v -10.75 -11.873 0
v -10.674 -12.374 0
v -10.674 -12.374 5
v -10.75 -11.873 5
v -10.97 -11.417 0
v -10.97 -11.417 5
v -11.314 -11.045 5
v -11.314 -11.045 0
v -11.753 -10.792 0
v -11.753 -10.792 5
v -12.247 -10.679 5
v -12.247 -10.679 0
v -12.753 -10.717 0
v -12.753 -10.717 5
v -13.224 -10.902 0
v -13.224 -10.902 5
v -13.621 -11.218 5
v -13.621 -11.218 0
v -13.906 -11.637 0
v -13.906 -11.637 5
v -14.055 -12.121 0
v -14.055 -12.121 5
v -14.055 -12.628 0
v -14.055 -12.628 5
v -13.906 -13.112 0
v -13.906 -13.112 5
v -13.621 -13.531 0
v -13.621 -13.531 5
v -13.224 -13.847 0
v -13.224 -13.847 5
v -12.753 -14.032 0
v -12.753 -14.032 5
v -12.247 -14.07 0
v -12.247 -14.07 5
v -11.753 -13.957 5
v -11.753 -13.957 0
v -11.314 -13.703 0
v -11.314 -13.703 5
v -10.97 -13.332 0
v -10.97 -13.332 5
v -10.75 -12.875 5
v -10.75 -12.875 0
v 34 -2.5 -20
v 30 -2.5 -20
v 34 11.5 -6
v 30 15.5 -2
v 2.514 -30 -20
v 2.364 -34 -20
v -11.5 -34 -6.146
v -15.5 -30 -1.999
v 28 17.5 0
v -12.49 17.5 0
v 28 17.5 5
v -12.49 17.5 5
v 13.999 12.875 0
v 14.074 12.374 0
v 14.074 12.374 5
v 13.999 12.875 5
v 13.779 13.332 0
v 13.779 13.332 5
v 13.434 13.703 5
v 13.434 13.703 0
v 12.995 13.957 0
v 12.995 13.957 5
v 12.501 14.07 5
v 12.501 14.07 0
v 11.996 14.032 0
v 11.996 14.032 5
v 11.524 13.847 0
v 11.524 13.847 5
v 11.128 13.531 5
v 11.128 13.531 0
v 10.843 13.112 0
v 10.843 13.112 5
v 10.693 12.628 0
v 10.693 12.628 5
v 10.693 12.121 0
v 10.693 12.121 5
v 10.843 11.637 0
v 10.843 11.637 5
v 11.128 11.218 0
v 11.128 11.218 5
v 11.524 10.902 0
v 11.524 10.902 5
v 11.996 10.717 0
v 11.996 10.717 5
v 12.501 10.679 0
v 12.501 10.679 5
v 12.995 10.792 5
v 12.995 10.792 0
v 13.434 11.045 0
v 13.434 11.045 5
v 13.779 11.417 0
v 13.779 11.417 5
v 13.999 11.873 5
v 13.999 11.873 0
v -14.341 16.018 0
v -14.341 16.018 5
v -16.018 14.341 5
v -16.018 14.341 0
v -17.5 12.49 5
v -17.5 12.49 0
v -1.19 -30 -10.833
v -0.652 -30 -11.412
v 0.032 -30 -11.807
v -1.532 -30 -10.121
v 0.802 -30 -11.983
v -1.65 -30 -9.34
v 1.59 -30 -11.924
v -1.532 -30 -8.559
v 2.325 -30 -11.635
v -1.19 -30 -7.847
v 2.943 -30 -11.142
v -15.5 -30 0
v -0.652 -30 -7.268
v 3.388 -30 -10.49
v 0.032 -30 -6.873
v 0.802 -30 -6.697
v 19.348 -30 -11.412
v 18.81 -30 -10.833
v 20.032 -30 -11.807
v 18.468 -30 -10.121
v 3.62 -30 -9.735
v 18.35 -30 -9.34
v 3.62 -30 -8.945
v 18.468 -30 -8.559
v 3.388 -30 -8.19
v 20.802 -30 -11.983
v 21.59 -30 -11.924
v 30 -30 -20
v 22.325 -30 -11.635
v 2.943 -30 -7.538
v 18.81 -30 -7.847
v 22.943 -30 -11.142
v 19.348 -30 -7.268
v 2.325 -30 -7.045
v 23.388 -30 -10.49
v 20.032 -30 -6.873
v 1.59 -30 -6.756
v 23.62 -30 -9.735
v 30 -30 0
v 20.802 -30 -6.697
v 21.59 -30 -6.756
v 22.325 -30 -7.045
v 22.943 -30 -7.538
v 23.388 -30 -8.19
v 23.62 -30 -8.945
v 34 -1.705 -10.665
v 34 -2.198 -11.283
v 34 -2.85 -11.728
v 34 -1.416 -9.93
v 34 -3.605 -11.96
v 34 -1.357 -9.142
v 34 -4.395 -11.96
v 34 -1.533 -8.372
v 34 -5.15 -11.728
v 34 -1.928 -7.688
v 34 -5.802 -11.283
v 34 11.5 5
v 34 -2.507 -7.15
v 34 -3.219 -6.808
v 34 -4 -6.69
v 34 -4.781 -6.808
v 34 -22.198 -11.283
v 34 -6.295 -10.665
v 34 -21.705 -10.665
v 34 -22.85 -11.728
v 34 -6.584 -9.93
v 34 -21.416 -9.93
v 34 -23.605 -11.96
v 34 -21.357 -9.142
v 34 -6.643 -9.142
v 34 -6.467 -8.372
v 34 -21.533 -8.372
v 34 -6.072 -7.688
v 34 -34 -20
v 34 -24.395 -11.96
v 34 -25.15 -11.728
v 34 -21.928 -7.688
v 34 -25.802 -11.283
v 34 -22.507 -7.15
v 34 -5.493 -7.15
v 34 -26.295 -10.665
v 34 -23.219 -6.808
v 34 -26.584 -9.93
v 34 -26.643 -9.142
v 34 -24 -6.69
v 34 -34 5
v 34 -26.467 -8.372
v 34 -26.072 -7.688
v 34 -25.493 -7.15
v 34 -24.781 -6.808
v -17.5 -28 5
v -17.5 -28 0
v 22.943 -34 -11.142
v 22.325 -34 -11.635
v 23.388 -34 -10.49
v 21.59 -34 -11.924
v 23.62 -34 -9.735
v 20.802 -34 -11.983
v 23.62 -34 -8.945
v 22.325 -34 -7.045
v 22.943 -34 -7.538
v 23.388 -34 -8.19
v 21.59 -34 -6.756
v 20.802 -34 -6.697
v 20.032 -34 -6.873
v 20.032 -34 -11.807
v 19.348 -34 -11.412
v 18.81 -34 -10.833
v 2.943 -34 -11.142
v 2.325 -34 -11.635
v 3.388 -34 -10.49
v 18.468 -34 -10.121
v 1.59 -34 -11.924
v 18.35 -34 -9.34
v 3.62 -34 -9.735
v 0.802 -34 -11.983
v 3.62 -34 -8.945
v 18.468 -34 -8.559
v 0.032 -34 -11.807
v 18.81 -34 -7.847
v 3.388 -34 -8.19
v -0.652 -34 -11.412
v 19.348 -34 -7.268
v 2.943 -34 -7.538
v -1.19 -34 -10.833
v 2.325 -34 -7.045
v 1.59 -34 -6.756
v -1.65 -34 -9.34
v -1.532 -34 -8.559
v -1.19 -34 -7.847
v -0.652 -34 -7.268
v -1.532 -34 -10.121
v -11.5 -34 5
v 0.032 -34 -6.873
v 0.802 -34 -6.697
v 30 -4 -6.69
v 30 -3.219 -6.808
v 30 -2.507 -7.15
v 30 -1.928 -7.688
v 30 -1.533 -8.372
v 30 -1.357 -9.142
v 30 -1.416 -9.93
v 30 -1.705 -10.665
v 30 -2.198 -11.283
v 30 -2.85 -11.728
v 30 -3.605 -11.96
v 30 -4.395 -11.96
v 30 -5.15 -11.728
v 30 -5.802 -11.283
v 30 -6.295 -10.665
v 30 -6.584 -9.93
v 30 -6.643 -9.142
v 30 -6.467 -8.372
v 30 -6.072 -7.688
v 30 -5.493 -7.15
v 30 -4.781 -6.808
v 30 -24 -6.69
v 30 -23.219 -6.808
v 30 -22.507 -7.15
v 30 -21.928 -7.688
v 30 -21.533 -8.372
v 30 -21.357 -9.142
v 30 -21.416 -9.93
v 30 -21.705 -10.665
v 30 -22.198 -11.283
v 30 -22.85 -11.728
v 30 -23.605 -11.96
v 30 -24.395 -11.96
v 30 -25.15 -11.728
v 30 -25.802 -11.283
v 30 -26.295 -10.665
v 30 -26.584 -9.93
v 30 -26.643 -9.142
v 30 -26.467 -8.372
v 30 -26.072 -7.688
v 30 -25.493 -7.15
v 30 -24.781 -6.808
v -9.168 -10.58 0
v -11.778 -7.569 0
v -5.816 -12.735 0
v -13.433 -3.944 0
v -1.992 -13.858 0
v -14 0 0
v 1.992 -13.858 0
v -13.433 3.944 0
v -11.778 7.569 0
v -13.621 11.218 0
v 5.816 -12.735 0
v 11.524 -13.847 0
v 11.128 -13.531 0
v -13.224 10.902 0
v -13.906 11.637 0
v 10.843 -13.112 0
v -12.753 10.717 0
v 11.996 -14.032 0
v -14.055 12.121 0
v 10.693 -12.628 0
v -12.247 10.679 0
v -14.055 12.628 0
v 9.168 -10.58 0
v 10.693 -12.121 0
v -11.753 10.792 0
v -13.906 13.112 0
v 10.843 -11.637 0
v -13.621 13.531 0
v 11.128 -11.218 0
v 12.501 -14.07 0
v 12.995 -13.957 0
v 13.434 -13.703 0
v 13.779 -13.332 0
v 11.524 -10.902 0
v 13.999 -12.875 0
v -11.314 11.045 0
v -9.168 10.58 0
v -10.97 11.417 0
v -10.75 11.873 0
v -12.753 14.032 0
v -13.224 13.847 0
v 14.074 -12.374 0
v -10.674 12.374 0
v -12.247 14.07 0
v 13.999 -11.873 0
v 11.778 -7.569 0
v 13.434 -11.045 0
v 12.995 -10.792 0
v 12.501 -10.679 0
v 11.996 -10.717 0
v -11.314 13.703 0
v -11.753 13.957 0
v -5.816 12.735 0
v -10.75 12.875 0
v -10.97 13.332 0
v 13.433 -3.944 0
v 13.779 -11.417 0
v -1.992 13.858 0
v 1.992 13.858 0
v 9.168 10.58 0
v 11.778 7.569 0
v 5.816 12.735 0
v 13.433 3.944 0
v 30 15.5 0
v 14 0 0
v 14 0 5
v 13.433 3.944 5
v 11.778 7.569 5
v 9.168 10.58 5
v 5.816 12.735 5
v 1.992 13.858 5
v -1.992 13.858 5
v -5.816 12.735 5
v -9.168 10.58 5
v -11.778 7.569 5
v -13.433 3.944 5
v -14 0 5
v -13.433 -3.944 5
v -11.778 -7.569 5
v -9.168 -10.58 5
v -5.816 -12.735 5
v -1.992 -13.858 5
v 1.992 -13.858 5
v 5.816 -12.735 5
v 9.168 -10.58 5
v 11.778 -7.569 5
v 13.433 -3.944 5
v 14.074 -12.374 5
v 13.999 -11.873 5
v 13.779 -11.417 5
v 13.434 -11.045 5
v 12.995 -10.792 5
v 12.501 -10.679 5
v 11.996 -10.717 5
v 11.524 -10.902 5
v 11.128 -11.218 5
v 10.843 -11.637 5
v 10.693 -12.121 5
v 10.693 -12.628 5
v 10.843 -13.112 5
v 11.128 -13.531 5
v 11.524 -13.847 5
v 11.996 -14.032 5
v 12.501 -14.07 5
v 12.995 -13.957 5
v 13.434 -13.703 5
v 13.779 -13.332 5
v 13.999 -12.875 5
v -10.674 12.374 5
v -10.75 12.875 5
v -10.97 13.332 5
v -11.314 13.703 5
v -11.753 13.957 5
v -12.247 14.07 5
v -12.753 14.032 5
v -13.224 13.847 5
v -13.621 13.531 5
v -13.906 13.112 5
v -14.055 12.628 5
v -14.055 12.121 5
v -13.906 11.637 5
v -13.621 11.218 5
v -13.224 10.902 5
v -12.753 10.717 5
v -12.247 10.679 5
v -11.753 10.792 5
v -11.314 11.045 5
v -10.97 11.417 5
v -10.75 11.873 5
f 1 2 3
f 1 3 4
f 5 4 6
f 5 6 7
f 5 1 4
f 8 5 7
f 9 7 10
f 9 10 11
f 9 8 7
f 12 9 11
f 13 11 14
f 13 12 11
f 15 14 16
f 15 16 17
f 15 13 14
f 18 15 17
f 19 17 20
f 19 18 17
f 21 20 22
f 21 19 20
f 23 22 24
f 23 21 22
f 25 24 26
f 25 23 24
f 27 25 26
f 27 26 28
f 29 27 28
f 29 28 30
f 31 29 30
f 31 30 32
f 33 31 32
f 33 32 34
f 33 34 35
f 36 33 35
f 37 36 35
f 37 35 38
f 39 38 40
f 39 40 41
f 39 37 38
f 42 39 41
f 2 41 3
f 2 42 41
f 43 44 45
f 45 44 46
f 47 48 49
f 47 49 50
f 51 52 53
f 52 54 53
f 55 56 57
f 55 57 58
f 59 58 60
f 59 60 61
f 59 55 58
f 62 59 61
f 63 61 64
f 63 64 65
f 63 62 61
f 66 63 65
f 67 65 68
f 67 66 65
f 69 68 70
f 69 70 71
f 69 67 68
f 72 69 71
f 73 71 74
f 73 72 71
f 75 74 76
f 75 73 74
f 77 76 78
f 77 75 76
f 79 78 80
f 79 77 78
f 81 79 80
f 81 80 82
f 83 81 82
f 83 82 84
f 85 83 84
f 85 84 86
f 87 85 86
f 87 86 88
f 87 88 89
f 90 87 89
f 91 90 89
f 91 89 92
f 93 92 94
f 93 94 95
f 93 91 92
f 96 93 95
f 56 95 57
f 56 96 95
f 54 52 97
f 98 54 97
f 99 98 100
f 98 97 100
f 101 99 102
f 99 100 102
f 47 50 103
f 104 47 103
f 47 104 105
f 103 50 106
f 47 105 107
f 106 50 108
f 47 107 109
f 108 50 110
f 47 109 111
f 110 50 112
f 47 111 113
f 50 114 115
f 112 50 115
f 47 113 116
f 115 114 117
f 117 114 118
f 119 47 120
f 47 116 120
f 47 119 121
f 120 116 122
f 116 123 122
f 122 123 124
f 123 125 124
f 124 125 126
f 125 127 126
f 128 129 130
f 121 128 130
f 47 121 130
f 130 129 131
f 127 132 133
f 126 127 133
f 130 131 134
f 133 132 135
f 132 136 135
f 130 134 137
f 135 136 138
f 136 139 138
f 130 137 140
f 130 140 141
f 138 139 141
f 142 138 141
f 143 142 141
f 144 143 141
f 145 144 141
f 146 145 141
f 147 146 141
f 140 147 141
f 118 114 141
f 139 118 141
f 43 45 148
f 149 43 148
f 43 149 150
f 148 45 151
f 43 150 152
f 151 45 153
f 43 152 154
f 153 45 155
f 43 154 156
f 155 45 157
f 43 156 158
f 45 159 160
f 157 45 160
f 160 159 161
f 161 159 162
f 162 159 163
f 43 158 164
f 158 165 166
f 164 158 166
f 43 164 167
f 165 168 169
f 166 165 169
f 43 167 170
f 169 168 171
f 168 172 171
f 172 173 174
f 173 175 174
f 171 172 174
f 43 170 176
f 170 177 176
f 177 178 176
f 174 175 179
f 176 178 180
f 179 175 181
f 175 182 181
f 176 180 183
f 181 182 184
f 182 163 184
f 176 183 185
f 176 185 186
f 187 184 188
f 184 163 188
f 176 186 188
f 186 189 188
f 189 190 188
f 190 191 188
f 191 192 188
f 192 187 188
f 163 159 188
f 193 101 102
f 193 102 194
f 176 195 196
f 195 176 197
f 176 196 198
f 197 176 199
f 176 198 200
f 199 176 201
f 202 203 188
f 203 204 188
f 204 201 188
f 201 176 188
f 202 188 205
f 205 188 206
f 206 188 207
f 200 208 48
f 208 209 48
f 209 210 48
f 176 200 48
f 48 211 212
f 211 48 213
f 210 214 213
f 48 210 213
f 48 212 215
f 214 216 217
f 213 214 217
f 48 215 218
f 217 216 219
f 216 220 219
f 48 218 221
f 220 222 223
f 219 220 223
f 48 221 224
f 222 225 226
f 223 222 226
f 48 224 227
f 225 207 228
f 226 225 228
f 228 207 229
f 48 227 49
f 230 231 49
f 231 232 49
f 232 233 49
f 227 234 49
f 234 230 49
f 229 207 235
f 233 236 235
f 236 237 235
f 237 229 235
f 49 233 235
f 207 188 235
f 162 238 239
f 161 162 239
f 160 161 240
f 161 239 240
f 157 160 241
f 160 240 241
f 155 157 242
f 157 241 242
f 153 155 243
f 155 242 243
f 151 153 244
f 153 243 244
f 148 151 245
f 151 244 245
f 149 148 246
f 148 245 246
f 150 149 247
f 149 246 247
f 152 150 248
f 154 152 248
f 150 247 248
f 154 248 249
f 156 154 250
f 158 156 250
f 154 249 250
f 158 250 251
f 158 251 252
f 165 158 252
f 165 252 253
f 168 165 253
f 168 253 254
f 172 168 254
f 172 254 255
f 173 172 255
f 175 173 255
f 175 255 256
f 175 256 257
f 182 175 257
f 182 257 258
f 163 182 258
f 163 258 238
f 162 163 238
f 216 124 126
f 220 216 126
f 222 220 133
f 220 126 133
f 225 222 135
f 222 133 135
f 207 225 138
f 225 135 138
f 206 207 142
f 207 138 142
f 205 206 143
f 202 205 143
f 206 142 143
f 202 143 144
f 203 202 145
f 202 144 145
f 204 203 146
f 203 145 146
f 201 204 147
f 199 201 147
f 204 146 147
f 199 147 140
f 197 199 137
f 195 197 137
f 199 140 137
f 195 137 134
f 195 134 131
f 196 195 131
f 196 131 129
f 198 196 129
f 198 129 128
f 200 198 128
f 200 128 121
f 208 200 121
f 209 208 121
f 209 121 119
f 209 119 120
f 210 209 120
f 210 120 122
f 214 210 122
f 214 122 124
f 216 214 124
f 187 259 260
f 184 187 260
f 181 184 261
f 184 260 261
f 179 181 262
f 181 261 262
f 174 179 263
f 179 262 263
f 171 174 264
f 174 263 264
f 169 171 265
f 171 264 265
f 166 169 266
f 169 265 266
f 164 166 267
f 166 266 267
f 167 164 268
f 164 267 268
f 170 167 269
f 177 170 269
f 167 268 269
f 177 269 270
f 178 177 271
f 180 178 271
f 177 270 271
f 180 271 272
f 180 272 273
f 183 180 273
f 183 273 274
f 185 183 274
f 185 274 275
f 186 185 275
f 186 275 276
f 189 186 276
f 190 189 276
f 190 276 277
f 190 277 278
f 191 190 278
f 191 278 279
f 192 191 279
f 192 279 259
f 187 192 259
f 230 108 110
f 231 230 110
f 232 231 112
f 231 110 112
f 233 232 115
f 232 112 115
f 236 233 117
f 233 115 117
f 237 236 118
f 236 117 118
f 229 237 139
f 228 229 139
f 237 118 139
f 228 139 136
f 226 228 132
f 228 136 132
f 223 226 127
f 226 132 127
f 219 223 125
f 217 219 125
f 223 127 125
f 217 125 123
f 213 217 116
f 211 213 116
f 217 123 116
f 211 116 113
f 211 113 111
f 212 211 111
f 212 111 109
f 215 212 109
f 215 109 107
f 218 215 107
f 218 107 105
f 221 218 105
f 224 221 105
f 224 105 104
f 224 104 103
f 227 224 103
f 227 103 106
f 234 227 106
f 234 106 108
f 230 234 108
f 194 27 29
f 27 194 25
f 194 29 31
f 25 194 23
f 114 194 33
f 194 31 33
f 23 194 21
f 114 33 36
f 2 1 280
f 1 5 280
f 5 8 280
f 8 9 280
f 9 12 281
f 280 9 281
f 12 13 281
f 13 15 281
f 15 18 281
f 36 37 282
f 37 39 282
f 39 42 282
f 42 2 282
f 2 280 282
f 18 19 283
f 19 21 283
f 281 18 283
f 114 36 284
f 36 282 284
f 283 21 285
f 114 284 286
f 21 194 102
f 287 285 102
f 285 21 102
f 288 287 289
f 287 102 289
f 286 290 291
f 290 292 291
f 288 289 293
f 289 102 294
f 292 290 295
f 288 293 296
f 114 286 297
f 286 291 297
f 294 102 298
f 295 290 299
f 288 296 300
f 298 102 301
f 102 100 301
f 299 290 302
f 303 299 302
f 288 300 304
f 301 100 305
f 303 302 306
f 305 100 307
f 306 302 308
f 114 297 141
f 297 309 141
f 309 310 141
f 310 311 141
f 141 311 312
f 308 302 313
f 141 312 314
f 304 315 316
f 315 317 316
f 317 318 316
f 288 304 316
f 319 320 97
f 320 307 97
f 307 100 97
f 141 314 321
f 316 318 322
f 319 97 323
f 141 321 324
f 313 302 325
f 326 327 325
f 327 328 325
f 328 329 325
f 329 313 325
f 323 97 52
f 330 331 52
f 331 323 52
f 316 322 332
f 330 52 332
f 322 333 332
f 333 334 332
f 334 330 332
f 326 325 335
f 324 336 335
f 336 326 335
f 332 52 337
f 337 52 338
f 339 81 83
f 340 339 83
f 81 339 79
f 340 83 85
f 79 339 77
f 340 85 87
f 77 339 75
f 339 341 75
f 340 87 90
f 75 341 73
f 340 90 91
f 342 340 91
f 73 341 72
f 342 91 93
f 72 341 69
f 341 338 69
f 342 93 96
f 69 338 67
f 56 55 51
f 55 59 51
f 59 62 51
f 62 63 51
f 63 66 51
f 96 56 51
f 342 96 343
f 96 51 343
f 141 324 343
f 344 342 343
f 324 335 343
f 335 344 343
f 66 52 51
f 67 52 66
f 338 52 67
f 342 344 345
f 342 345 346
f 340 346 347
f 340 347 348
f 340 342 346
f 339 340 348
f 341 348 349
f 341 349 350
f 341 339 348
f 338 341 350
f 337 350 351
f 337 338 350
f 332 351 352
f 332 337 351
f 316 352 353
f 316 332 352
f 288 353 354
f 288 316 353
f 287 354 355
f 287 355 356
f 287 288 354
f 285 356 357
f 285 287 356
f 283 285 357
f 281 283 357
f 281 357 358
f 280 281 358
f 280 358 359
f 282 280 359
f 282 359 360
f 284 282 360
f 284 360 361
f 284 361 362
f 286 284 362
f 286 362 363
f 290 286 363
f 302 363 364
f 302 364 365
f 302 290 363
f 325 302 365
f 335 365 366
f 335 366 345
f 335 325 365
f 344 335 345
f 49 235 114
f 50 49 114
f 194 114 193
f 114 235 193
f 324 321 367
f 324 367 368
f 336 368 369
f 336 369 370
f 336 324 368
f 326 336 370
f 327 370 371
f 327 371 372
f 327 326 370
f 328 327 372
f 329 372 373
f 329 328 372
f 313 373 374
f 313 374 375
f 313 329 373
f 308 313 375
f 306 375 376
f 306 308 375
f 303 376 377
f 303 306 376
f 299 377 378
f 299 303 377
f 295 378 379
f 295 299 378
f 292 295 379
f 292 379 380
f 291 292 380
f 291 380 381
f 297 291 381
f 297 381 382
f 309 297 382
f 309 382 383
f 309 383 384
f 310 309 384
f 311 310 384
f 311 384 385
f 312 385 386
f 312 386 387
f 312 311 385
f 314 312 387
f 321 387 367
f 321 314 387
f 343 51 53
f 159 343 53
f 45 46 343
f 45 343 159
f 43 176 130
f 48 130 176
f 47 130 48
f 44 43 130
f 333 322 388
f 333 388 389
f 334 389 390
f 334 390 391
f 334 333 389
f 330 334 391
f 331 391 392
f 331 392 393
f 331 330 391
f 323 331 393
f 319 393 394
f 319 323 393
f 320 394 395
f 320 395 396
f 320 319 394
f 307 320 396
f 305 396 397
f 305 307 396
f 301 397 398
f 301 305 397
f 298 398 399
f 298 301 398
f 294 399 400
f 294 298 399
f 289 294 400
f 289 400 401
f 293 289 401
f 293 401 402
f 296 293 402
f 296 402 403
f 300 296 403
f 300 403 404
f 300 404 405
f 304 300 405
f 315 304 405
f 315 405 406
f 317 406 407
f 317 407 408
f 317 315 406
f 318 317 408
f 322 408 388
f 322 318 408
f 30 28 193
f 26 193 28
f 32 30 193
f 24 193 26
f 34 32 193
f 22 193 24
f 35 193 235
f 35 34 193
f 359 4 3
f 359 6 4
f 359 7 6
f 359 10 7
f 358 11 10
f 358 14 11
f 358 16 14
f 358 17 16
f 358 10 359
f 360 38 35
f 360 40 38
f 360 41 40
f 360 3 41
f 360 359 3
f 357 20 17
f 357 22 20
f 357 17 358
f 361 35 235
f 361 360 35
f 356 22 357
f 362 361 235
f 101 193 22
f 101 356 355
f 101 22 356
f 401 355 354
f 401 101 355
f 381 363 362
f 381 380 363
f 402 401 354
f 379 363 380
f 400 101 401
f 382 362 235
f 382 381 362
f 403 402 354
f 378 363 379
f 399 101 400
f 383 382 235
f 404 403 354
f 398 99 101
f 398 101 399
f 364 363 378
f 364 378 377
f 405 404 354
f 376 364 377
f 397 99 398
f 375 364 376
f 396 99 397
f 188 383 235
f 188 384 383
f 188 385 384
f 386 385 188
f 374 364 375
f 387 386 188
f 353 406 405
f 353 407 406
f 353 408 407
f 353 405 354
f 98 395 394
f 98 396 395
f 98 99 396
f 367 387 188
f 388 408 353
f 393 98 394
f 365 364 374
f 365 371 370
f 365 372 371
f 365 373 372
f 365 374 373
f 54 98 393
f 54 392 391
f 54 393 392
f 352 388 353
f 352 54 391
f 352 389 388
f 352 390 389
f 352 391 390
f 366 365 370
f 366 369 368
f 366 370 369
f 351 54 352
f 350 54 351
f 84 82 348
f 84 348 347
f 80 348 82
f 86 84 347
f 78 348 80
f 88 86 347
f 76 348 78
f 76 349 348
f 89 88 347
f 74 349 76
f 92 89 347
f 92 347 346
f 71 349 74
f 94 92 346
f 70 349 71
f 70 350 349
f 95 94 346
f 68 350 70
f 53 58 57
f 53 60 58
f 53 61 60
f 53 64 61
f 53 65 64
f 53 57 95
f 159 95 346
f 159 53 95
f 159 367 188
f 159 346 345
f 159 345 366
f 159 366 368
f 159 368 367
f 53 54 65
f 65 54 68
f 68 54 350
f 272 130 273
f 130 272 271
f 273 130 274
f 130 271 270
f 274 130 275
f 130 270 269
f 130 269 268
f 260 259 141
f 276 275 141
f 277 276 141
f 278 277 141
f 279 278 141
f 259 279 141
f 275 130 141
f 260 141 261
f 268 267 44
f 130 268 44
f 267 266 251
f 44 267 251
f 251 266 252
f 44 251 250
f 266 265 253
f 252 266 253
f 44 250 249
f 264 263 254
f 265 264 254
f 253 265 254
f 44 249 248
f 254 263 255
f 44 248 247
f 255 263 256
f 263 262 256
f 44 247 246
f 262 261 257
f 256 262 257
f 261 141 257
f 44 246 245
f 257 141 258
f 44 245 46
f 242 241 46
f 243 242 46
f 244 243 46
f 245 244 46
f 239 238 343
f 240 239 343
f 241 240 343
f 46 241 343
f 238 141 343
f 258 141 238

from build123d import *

# Parameters (mm, degrees)
ESQUISSE2_R             = 14
ESQUISSE2_R_2           = 1.7
BOSS_EXTRU_1_DEPTH      = 5
BOSS_EXTRU_2_DEPTH      = 5
BOSS_EXTRU_3_DEPTH      = 20
CHANFREIN1_SIZE         = 20
ENL_V_MAT_EXTRU_1_DEPTH = 25
CHANFREIN2_SIZE         = 6
ESQUISSE6_R             = 2.65
ENL_V_MAT_EXTRU_2_DEPTH = 25
ESQUISSE7_R             = 2.65
ENL_V_MAT_EXTRU_3_DEPTH = 25


# Some blends are built 0.0001 mm under size
with BuildPart() as part:
    # Esquisse2 → Boss.-Extru.1 (new body)
    with BuildSketch(Plane.XY):
        with BuildLine():
            Line((12.489995997, 17.5), (-12.489995997, 17.5))
            ThreePointArc((-12.489995997, 17.5), (-15.202795796, 15.202795796), (-17.5, 12.489995997))
            Line((-17.5, 12.489995997), (-17.5, -12.489995997))
            ThreePointArc((-17.5, -12.489995997), (-15.202795796, -15.202795796), (-12.489995997, -17.5))
            Line((-12.489995997, -17.5), (12.489995997, -17.5))
            ThreePointArc((12.489995997, -17.5), (15.202795796, -15.202795796), (17.5, -12.489995997))
            Line((17.5, -12.489995997), (17.5, 12.489995997))
            ThreePointArc((17.5, 12.489995997), (15.202795796, 15.202795796), (12.489995997, 17.5))
        make_face()
        Circle(ESQUISSE2_R, mode=Mode.SUBTRACT)
        with Locations((-12.374368671, -12.374368671)):
            Circle(ESQUISSE2_R_2, mode=Mode.SUBTRACT)
        with Locations((12.374368671, -12.374368671)):
            Circle(ESQUISSE2_R_2, mode=Mode.SUBTRACT)
        with Locations((12.374368671, 12.374368671)):
            Circle(ESQUISSE2_R_2, mode=Mode.SUBTRACT)
        with Locations((-12.374368671, 12.374368671)):
            Circle(ESQUISSE2_R_2, mode=Mode.SUBTRACT)
    extrude(amount=BOSS_EXTRU_1_DEPTH)



with BuildPart() as body_2:
    # Esquisse3 → Boss.-Extru.2 (new body)
    with BuildSketch(Plane.XY.offset(5)):
        with BuildLine():
            Line((-17.5, -12.489995997), (-17.5, -34))
            Line((-17.5, -34), (34, -34))
            Line((34, -34), (34, 17.5))
            Line((34, 17.5), (12.489995997, 17.5))
            ThreePointArc((12.489995997, 17.5), (15.202795796, 15.202795796), (17.5, 12.489995997))
            Line((17.5, 12.489995997), (17.5, -12.489995997))
            ThreePointArc((17.5, -12.489995997), (15.202795796, -15.202795796), (12.489995997, -17.5))
            Line((12.489995997, -17.5), (-12.489995997, -17.5))
            ThreePointArc((-12.489995997, -17.5), (-15.202795796, -15.202795796), (-17.5, -12.489995997))
        make_face()
    extrude(amount=-BOSS_EXTRU_2_DEPTH)


with BuildPart() as part_1:
    add(part.part)

    add(body_2.part)  # Boss.-Extru.3 merges body 2
    # Esquisse4 → Boss.-Extru.3 (add)
    with BuildSketch(Plane(origin=(0, 0, 0), x_dir=(-1, 0, 0), z_dir=(0, 0, -1))):
        Polygon((-34, 17.5), (-34, -34), (17.65, -34), (17.5, -30), (-30, -30), (-30, 17.5), align=None)
    extrude(amount=BOSS_EXTRU_3_DEPTH)

    # Chanfrein1
    chanfrein1_edges = [part_1.edges().sort_by_distance(p)[0] for p in [
        (32, 17.5, -20),
        (-17.575, -32, -20),
    ]]
    chamfer(chanfrein1_edges, length=CHANFREIN1_SIZE - 0.0001)  # a hair under: the kernel refuses the full size

    # Esquisse5 → Enlèv. mat.-Extru.1 (cut)
    with BuildSketch(Plane.XY):
        Polygon((-17.5, -34), (-17.5, -30), (-17.65, -34), align=None)
    extrude(amount=-ENL_V_MAT_EXTRU_1_DEPTH, mode=Mode.SUBTRACT)

    # Chanfrein2
    # the kernel refuses this chamfer: 6 mm, written as the material it takes off along each edge
    with BuildSketch(Plane(origin=(-17.5, -34, 20.430097928), x_dir=(0.9996219169112969, -0.027495876610582164, 0), z_dir=(0, 0, -1))) as chanfrein2_piece_1:
        Polygon((CHANFREIN2_SIZE * 0.999621916911, -CHANFREIN2_SIZE * 0.0274958766106), (-CHANFREIN2_SIZE * 0.0274958766106, -CHANFREIN2_SIZE * 0.999621916911), (0, 0), align=None)
    extrude(amount=36.010190498, mode=Mode.SUBTRACT)
    with BuildSketch(Plane(origin=(34, 17.5, -15.430197928), x_dir=(-0.9996219169112969, 0.027495876610585633, 0), z_dir=(0, 0, 1))) as chanfrein2_piece_2:
        Polygon((CHANFREIN2_SIZE * 0.999621916911, CHANFREIN2_SIZE * 0.0274958766106), (-CHANFREIN2_SIZE * 0.0274958766106, CHANFREIN2_SIZE * 0.999621916911), (0, 0), align=None)
    extrude(amount=35.860295856, mode=Mode.SUBTRACT)

    # Esquisse6 → Enlèv. mat.-Extru.2 (cut)
    with BuildSketch(Plane.ZY.offset(-30)):
        with Locations((-9.34, -4)):
            Circle(ESQUISSE6_R)
        with Locations((-9.34, -24)):
            Circle(ESQUISSE6_R)
    extrude(amount=-ENL_V_MAT_EXTRU_2_DEPTH, mode=Mode.SUBTRACT)

    # Esquisse7 → Enlèv. mat.-Extru.3 (cut)
    with BuildSketch(Plane(origin=(0, -30, 0), x_dir=(1, 0, 0), z_dir=(0, 1, 0))):
        with Locations(Location((1, 9.34, 0), (0, 0, 180))):
            Circle(ESQUISSE7_R)
        with Locations(Location((21, 9.34, 0), (0, 0, 180))):
            Circle(ESQUISSE7_R)
    extrude(amount=-ENL_V_MAT_EXTRU_3_DEPTH, mode=Mode.SUBTRACT)


solid = part_1.part
